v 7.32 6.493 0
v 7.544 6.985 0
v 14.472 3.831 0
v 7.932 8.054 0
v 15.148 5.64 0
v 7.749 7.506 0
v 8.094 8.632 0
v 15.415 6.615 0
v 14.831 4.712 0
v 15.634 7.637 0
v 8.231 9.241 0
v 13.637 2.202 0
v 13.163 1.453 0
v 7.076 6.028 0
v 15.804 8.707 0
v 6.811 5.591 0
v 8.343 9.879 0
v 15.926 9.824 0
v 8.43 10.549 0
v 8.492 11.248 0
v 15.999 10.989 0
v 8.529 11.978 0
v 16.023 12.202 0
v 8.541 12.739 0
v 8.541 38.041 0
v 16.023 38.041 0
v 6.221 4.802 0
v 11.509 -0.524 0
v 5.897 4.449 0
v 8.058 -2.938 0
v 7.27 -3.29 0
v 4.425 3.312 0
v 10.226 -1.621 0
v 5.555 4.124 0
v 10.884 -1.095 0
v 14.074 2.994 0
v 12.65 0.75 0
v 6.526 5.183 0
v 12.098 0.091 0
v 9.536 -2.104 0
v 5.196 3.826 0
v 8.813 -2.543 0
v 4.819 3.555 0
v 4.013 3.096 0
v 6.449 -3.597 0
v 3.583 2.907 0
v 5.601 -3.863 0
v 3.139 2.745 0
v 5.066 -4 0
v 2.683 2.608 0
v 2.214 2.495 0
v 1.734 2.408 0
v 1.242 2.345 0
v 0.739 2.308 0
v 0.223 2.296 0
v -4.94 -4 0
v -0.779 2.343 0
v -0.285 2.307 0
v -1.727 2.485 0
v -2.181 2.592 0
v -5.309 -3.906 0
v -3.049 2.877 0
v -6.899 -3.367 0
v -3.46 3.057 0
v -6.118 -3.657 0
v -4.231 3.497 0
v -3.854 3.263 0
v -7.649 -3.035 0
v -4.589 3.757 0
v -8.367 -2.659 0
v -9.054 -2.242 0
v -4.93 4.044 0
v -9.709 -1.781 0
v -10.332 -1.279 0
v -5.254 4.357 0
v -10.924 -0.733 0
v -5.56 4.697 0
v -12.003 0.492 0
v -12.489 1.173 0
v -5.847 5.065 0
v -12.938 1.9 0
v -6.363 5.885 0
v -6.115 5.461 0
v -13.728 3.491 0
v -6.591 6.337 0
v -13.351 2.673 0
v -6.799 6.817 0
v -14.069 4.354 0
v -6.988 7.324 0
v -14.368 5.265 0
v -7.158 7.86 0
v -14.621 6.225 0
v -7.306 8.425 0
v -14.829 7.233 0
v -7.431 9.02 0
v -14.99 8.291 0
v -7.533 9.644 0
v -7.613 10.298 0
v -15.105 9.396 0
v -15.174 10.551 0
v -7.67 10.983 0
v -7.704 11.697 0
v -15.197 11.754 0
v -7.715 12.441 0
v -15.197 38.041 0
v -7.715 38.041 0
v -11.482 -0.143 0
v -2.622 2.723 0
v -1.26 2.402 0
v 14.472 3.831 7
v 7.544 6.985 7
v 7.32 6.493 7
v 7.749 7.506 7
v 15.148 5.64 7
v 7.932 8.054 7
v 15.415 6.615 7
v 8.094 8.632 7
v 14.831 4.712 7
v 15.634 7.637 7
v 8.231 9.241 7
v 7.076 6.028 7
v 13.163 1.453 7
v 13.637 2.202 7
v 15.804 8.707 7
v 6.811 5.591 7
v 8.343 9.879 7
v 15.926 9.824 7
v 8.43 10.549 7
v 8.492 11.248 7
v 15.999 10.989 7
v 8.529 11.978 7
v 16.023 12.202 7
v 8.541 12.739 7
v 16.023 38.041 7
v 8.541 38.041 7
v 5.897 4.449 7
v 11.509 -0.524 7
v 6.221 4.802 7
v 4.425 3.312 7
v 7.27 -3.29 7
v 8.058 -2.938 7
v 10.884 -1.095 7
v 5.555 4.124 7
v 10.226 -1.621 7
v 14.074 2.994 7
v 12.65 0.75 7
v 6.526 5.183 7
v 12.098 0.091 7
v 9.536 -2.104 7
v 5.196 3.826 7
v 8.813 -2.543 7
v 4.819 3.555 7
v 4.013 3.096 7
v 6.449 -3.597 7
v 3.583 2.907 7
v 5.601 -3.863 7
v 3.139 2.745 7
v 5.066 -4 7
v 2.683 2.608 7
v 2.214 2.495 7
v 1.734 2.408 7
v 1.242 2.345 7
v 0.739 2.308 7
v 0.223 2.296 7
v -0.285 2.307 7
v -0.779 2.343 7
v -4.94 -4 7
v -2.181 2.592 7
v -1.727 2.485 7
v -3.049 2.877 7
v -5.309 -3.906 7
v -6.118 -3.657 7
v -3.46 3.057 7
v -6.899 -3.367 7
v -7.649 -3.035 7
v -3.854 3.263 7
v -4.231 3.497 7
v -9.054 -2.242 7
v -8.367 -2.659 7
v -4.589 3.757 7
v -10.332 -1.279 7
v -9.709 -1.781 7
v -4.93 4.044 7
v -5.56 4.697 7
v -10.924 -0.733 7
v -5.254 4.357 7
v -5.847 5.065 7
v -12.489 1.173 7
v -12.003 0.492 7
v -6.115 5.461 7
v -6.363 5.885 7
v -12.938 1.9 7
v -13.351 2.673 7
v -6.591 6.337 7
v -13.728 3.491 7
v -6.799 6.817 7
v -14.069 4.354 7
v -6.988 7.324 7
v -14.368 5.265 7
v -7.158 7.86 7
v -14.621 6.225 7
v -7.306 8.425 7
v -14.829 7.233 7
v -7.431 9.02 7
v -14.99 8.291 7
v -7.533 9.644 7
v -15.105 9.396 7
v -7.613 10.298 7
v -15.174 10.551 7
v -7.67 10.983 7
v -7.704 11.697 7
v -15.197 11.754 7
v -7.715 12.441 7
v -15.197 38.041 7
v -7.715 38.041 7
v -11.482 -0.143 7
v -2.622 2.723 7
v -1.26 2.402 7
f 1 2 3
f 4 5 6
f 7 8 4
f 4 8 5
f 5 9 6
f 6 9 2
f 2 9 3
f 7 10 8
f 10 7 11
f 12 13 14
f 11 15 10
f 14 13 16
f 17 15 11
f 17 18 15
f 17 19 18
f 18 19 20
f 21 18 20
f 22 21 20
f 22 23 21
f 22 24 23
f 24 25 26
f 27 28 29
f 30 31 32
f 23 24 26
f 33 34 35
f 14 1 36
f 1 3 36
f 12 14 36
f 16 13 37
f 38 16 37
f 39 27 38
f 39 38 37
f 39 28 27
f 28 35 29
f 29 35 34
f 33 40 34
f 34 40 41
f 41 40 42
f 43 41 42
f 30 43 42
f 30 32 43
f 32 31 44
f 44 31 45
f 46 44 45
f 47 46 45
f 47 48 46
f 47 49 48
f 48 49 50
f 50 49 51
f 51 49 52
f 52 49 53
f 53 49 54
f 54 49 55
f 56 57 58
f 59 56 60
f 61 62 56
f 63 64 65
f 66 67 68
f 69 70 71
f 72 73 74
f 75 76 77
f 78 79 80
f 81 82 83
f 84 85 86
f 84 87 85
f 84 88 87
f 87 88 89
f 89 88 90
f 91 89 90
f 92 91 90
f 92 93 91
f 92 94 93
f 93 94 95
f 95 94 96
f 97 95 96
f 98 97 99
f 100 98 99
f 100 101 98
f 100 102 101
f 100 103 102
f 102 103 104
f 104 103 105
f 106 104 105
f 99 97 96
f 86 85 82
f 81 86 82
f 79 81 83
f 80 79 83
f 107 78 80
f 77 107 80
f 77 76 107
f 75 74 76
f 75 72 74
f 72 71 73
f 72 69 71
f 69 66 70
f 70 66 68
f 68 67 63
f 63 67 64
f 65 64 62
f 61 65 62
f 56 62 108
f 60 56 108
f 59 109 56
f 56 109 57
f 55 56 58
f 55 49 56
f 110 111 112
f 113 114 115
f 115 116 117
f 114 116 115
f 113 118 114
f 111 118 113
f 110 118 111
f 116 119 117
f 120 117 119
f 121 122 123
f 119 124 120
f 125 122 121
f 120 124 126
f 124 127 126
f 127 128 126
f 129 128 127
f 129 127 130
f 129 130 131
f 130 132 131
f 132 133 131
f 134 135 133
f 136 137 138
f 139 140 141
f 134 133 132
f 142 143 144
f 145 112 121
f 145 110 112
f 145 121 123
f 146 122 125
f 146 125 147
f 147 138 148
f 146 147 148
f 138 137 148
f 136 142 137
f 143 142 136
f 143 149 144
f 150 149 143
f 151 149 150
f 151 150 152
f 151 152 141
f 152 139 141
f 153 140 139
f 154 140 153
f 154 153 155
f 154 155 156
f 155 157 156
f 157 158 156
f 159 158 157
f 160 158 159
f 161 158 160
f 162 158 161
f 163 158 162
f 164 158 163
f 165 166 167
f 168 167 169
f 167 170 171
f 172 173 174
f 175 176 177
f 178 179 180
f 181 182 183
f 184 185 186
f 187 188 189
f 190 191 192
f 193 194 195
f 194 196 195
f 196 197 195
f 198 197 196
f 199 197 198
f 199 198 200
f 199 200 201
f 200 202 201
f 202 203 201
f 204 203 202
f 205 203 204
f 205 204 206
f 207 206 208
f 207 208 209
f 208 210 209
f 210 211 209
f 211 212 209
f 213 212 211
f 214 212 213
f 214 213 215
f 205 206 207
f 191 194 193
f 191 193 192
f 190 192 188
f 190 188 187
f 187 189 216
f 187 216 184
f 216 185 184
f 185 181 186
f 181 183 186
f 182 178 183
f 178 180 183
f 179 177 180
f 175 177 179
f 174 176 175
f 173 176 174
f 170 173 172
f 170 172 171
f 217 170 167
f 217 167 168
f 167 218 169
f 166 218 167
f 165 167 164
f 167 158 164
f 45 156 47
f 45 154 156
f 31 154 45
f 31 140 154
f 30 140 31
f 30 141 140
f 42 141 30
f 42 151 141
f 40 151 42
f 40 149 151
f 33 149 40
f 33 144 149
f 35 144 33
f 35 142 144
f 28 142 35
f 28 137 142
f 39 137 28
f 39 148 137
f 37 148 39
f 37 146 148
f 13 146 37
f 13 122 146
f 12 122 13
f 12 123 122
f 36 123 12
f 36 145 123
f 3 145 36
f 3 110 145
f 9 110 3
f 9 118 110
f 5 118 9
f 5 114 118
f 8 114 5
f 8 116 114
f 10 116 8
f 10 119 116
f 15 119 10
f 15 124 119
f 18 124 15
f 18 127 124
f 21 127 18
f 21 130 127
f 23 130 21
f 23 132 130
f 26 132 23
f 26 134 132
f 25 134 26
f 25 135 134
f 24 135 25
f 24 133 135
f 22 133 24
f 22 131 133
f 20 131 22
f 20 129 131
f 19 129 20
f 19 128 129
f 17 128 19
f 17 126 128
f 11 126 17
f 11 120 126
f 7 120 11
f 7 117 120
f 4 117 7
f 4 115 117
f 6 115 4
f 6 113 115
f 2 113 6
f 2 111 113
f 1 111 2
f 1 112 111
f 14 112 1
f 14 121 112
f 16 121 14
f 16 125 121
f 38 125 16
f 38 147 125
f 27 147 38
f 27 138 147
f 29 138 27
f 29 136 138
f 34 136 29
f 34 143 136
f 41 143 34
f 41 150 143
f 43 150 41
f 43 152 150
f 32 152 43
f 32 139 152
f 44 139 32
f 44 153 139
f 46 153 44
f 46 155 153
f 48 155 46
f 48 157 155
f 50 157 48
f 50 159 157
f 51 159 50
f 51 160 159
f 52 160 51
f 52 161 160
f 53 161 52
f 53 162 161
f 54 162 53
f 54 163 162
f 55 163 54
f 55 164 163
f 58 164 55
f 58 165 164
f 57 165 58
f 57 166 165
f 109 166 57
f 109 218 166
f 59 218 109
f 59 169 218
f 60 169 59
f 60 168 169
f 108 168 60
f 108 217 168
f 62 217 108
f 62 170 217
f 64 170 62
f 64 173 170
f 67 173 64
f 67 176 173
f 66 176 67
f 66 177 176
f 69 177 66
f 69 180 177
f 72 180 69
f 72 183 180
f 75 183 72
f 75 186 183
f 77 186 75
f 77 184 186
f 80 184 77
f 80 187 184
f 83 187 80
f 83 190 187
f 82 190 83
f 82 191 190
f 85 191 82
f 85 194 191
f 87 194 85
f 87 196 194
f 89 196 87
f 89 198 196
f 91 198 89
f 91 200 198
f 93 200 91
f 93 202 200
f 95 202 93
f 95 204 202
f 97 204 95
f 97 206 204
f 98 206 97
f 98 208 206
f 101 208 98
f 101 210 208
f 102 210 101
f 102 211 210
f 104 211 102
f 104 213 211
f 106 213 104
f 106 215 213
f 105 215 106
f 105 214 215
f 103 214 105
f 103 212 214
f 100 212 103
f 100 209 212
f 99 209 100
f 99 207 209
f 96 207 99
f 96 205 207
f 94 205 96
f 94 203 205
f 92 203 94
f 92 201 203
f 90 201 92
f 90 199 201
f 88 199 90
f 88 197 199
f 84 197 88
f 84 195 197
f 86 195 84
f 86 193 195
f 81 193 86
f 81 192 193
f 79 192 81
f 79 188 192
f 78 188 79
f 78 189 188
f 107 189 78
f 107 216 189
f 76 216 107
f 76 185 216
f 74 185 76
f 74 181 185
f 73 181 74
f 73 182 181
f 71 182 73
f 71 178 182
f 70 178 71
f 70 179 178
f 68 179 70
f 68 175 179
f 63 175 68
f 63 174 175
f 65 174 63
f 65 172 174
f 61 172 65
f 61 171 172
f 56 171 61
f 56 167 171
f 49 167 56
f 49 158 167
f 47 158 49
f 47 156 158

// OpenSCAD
// file: glyph.scad
// glyph — the shared geometry of every letter in the set. Defines named geometry
// only, so it renders nothing on its own; each letter part includes it and calls
// letter(). Every dimension lives in ../../lib/common.scad.
//
// A LETTER IS NOTHING BUT A LETTER. No plinth, no tongue, no tab — it is the
// bare glyph, and it attaches by standing in the deck groove and resting on the
// groove's floor. Anything else on it would be a distraction on a learning toy.
//
// It is a flat plate of one thickness, printed face-down: no overhang anywhere,
// no supports, and the face on the bed comes out smoothest.
//
// TWO TRAPS WITH text():
//
//  * A missing font FALLS BACK SILENTLY — no warning, no error, just different
//    letters. "Liberation Sans" was the first choice here because OpenSCAD
//    bundles it; on macOS the bundled faces are not registered with fontconfig,
//    so it rendered the fallback face instead and nothing said so. To check a
//    font resolved, render a string with it and with a deliberately bogus name
//    and compare bounding boxes: identical means it fell back.
//  * `size` is not the cap height in general. For Helvetica Bold they coincide
//    (size 44 -> 44.0 mm cap), which is why letter_size reads as a height.
//    Change the font and re-measure.

include <../../lib/common.scad>

// The letter's outline, upright in the XY plane, ready to be extruded along Z
// (which is the letter's thickness, and the print's build axis).
//
//   y = 0   is the deck surface
//   y < 0   is the part standing down inside the groove. It reaches letter_bury,
//           which is where the tapered groove closes to letter_t — NOT the
//           groove's floor. The letter wedges; it never bottoms out.
module glyph_2d(ch) {
    intersection() {
        translate([0, -letter_bury])
            scale([letter_condense, 1])
                text(ch, size = letter_size, font = letter_font,
                     halign = "center", valign = "baseline");
        // Trimmed flat at the baseline. Round letters (O, C, G, S) overshoot the
        // baseline by design, and a letter standing on a convex curve rocks —
        // there is nothing to stop it leaning. The trim costs nothing visible
        // and gives every letter a flat foot on the groove floor.
        translate([-200, -letter_bury]) square([400, 400]);
    }
}

// One letter, in its print orientation: lying on its face, thickness up Z.
module letter(ch) {
    linear_extrude(letter_t) glyph_2d(ch);
}

// Where that letter sits once it is dropped into a chassis, for fit checks.
module letter_fitted(ch) {
    translate([0, letter_t/2, body_top]) rotate([90, 0, 0]) letter(ch);
}
// main file
// letter U — one part. See glyph.scad for the geometry and lib/common.scad for
// the dimensions. Prints lying on its face, exactly as exported: no supports.

include <glyph.scad>

letter("U");
